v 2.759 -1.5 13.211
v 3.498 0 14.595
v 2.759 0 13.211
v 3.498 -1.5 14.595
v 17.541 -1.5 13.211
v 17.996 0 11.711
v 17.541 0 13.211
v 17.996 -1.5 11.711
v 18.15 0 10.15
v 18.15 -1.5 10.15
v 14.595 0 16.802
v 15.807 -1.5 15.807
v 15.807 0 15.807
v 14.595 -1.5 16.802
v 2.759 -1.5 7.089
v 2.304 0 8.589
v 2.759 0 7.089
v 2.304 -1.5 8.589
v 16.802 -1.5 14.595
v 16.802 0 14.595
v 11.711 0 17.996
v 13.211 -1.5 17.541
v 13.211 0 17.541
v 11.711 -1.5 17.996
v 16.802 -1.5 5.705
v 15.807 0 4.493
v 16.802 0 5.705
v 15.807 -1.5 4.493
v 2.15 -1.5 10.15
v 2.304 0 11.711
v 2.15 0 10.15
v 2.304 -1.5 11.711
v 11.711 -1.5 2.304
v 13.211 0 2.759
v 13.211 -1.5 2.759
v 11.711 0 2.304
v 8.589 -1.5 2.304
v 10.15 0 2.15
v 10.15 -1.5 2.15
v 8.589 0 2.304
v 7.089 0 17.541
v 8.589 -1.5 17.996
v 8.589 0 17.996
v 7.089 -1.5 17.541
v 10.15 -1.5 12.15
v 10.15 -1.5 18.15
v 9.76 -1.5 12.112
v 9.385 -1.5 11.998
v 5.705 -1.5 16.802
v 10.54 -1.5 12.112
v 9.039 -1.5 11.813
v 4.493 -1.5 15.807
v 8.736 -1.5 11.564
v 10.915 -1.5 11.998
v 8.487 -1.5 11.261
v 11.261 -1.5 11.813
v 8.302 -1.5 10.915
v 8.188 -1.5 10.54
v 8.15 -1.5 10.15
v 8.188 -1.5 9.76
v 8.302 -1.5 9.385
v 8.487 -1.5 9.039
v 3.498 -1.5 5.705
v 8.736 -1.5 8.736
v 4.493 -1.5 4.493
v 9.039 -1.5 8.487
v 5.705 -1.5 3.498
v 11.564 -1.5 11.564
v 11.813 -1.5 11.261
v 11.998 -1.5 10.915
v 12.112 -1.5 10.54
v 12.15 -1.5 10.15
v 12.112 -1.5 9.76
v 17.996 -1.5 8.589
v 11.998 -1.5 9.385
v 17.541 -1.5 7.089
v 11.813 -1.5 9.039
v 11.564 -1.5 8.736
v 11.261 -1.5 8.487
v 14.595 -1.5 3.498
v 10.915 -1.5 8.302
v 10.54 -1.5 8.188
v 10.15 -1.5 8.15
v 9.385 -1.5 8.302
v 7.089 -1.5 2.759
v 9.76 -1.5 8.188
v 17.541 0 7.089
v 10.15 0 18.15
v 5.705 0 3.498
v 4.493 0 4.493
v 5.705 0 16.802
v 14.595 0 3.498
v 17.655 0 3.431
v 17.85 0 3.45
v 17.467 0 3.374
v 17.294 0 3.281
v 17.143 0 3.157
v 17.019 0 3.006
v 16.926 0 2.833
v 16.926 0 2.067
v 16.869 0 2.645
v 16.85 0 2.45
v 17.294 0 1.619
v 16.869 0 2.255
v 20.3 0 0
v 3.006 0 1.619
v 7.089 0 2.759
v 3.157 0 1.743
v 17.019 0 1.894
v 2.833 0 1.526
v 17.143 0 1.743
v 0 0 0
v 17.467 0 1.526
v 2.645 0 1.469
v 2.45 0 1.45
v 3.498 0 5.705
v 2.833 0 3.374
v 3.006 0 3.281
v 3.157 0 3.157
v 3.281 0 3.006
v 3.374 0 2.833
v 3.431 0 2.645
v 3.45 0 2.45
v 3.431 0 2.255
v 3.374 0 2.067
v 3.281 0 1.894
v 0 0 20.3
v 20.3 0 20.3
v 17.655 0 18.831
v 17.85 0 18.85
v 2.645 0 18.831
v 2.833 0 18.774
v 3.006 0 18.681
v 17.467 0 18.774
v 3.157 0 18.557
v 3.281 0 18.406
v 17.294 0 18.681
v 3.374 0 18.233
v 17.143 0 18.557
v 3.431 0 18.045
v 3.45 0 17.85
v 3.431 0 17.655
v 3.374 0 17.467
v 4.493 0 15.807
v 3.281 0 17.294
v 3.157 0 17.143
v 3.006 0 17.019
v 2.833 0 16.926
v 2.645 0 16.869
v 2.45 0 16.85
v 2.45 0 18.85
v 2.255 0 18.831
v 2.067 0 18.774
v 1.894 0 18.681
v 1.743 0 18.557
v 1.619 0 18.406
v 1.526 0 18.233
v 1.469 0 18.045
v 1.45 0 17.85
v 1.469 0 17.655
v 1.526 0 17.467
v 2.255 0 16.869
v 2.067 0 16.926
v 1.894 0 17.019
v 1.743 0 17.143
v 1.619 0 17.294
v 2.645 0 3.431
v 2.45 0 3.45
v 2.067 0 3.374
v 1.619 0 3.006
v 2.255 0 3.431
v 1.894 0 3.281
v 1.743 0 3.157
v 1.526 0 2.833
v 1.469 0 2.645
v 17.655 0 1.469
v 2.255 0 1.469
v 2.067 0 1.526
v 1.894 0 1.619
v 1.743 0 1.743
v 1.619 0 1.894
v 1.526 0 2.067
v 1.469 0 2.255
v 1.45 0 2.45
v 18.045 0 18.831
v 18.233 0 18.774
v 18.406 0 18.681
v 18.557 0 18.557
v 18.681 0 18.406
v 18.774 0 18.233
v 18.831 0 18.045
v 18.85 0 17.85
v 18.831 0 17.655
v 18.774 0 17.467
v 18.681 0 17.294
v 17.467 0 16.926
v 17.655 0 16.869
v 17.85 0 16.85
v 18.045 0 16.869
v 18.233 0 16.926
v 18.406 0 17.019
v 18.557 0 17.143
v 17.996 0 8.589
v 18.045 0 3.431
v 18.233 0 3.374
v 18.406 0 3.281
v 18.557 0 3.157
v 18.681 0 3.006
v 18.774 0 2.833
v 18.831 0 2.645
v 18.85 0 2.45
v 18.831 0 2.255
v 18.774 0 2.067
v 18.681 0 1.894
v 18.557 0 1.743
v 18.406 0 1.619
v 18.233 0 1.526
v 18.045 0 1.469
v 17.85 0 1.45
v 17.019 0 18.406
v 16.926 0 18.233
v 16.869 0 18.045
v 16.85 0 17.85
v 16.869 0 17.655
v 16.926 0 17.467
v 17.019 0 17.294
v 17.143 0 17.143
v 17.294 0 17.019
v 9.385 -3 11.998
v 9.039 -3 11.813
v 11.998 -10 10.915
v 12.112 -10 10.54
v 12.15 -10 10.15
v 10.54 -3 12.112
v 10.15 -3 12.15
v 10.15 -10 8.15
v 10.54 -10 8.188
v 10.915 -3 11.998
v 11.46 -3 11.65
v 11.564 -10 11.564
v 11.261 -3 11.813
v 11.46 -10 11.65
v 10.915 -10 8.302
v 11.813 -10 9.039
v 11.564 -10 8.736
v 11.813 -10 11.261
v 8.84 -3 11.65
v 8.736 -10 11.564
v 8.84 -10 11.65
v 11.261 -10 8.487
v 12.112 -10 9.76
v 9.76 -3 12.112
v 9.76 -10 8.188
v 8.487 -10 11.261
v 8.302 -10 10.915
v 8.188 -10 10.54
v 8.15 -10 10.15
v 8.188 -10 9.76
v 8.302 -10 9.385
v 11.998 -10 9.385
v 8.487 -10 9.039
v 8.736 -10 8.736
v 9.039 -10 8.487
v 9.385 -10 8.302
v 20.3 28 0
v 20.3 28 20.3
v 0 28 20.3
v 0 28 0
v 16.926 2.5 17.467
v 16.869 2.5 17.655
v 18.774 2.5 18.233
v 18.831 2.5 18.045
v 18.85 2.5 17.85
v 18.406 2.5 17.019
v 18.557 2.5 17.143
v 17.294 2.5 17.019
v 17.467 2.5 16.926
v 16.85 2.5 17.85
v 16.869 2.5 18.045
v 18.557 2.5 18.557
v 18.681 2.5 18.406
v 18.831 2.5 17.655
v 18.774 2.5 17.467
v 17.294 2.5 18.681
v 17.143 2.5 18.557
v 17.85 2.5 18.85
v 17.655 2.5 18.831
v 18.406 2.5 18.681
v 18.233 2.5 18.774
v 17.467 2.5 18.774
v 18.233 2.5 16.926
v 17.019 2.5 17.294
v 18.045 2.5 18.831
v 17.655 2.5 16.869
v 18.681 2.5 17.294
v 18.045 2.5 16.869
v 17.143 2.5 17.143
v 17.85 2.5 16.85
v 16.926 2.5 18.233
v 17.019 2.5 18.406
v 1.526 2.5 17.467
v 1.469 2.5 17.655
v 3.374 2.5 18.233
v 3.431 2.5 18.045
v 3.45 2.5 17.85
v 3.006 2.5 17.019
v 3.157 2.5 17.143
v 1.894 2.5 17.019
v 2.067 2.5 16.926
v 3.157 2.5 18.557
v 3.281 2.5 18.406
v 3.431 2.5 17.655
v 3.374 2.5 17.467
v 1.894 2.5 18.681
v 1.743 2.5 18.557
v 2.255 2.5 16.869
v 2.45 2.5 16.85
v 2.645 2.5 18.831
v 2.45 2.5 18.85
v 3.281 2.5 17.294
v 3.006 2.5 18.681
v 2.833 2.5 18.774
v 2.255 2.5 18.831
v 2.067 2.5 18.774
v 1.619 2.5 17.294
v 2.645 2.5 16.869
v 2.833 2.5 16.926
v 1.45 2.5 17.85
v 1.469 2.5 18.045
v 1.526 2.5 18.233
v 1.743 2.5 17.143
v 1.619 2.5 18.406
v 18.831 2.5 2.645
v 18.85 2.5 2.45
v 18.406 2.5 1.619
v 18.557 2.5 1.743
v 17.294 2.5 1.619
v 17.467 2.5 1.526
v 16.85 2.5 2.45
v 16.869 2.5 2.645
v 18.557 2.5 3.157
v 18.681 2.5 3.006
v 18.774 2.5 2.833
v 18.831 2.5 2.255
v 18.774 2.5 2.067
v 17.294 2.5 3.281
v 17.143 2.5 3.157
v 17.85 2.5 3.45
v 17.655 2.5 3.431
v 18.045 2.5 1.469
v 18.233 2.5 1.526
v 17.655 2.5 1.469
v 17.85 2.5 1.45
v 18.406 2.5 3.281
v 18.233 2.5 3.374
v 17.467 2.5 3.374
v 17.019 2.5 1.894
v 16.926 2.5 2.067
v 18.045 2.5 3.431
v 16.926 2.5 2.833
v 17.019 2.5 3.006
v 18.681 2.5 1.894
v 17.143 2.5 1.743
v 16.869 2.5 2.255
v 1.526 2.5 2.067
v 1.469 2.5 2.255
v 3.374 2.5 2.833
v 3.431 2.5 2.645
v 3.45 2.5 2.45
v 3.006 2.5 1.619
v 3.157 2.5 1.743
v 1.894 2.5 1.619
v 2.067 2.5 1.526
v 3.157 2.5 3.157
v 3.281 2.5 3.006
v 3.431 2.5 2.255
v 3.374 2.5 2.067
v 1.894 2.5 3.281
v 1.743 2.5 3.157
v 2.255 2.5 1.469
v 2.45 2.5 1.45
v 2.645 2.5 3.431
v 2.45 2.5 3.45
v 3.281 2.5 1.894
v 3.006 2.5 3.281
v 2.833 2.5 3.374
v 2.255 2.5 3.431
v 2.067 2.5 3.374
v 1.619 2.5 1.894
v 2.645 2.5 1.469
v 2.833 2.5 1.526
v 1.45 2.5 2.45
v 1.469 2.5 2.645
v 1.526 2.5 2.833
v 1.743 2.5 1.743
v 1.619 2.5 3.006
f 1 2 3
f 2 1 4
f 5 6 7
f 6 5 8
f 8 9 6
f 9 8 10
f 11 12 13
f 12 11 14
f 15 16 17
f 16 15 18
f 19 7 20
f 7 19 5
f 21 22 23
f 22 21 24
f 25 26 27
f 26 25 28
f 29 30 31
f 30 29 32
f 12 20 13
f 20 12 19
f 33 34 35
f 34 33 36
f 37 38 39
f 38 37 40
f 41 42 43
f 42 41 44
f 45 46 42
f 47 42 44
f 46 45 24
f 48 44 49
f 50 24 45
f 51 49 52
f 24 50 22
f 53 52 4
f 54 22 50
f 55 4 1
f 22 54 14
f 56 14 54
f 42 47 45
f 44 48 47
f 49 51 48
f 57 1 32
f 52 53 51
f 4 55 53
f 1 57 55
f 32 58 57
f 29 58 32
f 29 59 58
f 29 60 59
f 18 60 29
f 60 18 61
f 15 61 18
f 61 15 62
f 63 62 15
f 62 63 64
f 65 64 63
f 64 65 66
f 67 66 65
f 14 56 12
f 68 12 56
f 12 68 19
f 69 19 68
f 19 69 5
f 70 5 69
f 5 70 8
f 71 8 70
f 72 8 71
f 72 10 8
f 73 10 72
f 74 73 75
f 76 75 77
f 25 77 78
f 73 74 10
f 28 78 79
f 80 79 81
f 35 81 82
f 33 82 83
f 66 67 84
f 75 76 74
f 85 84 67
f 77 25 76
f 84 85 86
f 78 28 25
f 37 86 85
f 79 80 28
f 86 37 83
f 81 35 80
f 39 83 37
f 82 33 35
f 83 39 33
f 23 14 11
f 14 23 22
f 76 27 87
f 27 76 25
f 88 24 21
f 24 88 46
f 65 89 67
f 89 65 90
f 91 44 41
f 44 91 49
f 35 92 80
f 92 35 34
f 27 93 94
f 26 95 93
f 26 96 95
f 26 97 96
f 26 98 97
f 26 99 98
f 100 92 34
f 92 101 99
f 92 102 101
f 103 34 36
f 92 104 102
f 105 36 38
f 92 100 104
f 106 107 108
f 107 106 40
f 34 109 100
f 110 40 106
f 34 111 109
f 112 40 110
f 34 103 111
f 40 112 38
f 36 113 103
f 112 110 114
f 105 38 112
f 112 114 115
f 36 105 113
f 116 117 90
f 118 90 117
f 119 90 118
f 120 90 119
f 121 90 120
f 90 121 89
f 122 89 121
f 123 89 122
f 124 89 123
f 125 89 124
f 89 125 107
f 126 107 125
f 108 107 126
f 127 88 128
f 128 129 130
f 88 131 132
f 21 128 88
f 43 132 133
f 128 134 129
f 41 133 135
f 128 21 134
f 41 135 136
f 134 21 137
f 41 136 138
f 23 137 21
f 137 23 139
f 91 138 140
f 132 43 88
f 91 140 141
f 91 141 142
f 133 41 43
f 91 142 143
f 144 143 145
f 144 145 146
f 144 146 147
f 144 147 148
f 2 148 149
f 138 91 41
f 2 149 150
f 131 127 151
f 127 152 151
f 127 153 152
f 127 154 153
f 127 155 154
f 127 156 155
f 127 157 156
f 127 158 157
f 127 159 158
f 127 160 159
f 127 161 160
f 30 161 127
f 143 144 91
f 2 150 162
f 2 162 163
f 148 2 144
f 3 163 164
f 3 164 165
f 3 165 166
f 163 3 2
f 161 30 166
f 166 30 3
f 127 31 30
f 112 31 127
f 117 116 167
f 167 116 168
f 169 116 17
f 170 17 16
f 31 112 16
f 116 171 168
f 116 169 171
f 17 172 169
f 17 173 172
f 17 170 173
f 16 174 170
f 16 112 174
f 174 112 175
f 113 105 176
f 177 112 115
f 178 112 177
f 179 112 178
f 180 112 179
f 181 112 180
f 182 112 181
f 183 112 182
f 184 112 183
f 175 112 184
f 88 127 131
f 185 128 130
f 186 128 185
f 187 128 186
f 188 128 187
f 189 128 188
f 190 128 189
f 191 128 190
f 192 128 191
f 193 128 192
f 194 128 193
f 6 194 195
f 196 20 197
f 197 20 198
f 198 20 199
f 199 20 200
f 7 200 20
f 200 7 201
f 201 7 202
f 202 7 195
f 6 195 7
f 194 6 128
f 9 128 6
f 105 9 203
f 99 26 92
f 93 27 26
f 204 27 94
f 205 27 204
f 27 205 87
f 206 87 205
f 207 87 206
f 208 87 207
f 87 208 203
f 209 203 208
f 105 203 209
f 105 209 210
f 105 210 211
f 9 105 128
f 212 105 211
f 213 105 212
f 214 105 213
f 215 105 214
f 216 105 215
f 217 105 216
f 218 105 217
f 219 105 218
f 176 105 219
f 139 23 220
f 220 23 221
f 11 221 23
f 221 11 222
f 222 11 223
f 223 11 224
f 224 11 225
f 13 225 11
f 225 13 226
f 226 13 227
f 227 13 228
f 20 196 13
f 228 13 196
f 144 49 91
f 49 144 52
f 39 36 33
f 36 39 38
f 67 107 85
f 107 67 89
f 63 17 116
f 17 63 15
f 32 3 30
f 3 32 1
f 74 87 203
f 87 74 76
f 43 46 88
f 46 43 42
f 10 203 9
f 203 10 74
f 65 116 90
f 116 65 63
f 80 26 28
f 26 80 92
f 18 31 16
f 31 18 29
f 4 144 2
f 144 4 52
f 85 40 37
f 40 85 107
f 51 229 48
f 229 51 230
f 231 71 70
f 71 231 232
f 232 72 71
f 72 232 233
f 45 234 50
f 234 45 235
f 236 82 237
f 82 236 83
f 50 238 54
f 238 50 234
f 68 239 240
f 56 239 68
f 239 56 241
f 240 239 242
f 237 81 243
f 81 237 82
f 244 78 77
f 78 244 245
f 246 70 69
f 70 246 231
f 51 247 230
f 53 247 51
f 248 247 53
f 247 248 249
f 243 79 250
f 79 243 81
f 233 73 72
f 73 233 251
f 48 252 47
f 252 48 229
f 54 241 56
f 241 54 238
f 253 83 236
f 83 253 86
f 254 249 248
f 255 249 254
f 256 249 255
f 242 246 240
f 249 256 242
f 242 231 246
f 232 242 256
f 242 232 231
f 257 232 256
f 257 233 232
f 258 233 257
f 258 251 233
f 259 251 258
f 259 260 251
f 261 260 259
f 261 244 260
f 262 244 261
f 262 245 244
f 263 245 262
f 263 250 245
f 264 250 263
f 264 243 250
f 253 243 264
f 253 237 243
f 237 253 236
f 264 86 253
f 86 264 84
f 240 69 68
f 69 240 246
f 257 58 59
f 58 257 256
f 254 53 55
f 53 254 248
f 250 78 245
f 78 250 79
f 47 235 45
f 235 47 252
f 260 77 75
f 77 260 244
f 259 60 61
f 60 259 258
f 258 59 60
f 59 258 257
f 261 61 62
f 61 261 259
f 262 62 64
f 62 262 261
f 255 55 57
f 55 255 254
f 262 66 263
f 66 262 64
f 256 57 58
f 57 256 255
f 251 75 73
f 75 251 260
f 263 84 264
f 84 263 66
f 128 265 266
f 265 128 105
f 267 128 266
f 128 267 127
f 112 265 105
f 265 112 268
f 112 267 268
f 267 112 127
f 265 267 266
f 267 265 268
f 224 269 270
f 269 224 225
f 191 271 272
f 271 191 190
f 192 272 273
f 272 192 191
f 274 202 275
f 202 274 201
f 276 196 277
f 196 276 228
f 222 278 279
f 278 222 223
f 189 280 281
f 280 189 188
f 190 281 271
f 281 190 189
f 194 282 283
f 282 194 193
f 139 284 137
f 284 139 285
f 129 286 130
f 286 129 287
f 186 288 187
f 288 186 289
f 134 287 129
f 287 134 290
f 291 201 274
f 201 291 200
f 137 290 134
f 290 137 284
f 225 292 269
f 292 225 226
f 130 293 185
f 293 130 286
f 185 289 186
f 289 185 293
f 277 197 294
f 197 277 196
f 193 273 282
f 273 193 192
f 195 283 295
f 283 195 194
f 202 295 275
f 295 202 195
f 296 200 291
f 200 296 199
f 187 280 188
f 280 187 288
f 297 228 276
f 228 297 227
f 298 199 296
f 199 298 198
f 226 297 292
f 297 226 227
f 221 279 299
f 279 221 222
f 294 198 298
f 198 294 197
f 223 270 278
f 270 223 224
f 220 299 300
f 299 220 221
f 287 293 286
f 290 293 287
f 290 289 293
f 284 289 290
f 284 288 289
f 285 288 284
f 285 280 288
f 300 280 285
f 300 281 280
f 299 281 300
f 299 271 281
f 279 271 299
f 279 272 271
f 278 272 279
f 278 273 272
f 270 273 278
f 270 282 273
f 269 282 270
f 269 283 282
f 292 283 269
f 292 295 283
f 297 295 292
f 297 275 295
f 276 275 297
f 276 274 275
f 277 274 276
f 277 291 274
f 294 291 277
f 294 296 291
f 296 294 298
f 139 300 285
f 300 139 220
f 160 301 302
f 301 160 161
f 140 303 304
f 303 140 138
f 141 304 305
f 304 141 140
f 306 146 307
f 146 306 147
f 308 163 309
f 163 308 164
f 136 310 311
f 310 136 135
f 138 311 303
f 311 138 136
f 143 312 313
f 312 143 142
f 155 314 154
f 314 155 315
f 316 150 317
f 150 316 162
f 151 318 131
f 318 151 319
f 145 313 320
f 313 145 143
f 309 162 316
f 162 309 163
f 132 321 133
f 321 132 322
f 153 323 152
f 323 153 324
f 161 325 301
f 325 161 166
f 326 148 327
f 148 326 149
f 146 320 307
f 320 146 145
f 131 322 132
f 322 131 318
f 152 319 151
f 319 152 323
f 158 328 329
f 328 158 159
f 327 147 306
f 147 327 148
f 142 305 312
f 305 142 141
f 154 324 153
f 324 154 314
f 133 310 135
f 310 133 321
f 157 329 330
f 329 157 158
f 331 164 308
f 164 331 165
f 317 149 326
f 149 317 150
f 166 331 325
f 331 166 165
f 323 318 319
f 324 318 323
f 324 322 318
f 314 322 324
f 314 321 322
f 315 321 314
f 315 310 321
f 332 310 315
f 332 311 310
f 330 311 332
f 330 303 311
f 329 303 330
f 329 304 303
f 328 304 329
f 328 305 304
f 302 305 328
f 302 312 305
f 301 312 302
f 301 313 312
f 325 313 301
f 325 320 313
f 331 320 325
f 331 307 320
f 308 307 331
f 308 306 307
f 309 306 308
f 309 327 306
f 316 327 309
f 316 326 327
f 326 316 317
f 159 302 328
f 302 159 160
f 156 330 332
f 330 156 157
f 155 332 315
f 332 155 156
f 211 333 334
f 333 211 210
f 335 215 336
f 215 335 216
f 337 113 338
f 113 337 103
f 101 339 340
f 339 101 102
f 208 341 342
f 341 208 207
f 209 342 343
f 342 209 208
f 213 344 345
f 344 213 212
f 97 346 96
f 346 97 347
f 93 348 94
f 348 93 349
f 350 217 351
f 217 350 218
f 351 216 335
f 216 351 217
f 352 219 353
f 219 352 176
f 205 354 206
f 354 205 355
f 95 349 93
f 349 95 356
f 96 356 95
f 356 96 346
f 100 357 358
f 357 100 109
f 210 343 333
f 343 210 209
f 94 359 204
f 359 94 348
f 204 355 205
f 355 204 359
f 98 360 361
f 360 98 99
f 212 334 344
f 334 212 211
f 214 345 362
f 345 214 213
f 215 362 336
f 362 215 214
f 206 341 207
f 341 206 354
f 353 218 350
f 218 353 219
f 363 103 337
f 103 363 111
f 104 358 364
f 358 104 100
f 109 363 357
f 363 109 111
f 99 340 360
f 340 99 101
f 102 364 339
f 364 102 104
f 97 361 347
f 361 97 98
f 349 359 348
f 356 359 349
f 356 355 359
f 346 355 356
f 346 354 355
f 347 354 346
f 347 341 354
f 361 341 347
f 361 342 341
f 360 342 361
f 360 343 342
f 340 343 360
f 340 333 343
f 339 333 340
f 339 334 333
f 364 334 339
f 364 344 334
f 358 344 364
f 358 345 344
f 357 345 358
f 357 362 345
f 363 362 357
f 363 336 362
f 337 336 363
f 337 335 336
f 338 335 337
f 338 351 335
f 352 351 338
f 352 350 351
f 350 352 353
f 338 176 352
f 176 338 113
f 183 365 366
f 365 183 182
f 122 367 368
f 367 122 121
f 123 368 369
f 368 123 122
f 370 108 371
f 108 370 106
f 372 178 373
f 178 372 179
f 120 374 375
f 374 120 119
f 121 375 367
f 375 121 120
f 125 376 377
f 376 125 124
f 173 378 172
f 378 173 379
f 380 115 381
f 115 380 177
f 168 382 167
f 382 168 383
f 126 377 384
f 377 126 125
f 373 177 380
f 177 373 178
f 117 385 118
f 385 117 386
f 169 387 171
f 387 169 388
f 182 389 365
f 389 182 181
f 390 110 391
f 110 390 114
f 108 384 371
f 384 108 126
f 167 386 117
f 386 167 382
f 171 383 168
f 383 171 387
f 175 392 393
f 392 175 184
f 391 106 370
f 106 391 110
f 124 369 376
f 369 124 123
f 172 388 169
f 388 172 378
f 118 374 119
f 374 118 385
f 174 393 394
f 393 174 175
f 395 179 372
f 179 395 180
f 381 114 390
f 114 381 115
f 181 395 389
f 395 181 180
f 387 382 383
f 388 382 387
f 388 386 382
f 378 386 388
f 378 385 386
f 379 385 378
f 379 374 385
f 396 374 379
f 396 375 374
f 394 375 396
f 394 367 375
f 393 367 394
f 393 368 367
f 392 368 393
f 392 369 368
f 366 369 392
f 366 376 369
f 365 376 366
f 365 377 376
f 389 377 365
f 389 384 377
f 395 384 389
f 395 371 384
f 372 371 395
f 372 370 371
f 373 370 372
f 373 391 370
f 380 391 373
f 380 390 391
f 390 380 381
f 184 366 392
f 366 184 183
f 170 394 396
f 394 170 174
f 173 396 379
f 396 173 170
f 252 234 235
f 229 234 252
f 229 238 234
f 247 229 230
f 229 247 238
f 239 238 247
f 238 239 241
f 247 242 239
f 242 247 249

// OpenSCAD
// WeePrusa
// Stepper Motors
// GNU GPL v3
// Thomas Phillips (tntexplosivesltd@gmail.com)
// https://github.com/tntexplosivesltd/WeePrusa

$fn = 32;

// Colours
black = [12/255, 12/255, 12/255];
grey = [200/255, 200/255, 200/255];

// Motor back
width = 20.3;
torque = 1.6;

// Shaft
shaft = 10;
shaft_radius = 2;
keyway = 7;
hub_radius = 8;
hub_width = 1.5;

// Screws
screw_size = 2;
screw_depth = 2.5;
screw_separation = 15.4;

function get_length(t) = lookup(t, [
			[1.6, 28],
			[1.8, 30],
			[2, 33],
			[3, 38],
			[4, 38],
	]);

length = get_length(torque);

difference()
{
	union()
	{
		color (black) cube ([width, length, width], center = false);
		color (grey)
		{
			translate ([width/2, 0, width/2])
			{
				rotate ([90,0,0]) cylinder (h = hub_width, r1 = hub_radius, r2 = hub_radius, center = false);
				rotate ([90,0,0]) cylinder (h = shaft, r1 = shaft_radius, r2 = shaft_radius, center = false);
			}
		}
	}
	
	color (grey)
	{
		translate([width/2, screw_depth, width/2])
		{
			// screw holes
			translate ([screw_separation/2, 0, screw_separation/2]) rotate ([90,0,0])
				cylinder (h = screw_depth+1, r1 = screw_size/2, r2 = screw_size/2, center = false);
			translate ([-screw_separation/2, 0, screw_separation/2]) rotate ([90,0,0])
				cylinder (h = screw_depth+1, r1 = screw_size/2, r2 = screw_size/2, center = false);
			translate ([screw_separation/2, 0, -screw_separation/2]) rotate ([90,0,0])
				cylinder (h = screw_depth+1, r1 = screw_size/2, r2 = screw_size/2, center = false);
			translate ([-screw_separation/2, 0, -screw_separation/2]) rotate ([90,0,0])
				cylinder (h = screw_depth+1, r1 = screw_size/2, r2 = screw_size/2, center = false);

			// flat on shaft
			rotate ([90,0,0]) translate ([-shaft_radius, shaft_radius-0.5, shaft+screw_depth-keyway]) 
				cube ([5, 0.5, keyway+1], center = false);
		}
	}
}
